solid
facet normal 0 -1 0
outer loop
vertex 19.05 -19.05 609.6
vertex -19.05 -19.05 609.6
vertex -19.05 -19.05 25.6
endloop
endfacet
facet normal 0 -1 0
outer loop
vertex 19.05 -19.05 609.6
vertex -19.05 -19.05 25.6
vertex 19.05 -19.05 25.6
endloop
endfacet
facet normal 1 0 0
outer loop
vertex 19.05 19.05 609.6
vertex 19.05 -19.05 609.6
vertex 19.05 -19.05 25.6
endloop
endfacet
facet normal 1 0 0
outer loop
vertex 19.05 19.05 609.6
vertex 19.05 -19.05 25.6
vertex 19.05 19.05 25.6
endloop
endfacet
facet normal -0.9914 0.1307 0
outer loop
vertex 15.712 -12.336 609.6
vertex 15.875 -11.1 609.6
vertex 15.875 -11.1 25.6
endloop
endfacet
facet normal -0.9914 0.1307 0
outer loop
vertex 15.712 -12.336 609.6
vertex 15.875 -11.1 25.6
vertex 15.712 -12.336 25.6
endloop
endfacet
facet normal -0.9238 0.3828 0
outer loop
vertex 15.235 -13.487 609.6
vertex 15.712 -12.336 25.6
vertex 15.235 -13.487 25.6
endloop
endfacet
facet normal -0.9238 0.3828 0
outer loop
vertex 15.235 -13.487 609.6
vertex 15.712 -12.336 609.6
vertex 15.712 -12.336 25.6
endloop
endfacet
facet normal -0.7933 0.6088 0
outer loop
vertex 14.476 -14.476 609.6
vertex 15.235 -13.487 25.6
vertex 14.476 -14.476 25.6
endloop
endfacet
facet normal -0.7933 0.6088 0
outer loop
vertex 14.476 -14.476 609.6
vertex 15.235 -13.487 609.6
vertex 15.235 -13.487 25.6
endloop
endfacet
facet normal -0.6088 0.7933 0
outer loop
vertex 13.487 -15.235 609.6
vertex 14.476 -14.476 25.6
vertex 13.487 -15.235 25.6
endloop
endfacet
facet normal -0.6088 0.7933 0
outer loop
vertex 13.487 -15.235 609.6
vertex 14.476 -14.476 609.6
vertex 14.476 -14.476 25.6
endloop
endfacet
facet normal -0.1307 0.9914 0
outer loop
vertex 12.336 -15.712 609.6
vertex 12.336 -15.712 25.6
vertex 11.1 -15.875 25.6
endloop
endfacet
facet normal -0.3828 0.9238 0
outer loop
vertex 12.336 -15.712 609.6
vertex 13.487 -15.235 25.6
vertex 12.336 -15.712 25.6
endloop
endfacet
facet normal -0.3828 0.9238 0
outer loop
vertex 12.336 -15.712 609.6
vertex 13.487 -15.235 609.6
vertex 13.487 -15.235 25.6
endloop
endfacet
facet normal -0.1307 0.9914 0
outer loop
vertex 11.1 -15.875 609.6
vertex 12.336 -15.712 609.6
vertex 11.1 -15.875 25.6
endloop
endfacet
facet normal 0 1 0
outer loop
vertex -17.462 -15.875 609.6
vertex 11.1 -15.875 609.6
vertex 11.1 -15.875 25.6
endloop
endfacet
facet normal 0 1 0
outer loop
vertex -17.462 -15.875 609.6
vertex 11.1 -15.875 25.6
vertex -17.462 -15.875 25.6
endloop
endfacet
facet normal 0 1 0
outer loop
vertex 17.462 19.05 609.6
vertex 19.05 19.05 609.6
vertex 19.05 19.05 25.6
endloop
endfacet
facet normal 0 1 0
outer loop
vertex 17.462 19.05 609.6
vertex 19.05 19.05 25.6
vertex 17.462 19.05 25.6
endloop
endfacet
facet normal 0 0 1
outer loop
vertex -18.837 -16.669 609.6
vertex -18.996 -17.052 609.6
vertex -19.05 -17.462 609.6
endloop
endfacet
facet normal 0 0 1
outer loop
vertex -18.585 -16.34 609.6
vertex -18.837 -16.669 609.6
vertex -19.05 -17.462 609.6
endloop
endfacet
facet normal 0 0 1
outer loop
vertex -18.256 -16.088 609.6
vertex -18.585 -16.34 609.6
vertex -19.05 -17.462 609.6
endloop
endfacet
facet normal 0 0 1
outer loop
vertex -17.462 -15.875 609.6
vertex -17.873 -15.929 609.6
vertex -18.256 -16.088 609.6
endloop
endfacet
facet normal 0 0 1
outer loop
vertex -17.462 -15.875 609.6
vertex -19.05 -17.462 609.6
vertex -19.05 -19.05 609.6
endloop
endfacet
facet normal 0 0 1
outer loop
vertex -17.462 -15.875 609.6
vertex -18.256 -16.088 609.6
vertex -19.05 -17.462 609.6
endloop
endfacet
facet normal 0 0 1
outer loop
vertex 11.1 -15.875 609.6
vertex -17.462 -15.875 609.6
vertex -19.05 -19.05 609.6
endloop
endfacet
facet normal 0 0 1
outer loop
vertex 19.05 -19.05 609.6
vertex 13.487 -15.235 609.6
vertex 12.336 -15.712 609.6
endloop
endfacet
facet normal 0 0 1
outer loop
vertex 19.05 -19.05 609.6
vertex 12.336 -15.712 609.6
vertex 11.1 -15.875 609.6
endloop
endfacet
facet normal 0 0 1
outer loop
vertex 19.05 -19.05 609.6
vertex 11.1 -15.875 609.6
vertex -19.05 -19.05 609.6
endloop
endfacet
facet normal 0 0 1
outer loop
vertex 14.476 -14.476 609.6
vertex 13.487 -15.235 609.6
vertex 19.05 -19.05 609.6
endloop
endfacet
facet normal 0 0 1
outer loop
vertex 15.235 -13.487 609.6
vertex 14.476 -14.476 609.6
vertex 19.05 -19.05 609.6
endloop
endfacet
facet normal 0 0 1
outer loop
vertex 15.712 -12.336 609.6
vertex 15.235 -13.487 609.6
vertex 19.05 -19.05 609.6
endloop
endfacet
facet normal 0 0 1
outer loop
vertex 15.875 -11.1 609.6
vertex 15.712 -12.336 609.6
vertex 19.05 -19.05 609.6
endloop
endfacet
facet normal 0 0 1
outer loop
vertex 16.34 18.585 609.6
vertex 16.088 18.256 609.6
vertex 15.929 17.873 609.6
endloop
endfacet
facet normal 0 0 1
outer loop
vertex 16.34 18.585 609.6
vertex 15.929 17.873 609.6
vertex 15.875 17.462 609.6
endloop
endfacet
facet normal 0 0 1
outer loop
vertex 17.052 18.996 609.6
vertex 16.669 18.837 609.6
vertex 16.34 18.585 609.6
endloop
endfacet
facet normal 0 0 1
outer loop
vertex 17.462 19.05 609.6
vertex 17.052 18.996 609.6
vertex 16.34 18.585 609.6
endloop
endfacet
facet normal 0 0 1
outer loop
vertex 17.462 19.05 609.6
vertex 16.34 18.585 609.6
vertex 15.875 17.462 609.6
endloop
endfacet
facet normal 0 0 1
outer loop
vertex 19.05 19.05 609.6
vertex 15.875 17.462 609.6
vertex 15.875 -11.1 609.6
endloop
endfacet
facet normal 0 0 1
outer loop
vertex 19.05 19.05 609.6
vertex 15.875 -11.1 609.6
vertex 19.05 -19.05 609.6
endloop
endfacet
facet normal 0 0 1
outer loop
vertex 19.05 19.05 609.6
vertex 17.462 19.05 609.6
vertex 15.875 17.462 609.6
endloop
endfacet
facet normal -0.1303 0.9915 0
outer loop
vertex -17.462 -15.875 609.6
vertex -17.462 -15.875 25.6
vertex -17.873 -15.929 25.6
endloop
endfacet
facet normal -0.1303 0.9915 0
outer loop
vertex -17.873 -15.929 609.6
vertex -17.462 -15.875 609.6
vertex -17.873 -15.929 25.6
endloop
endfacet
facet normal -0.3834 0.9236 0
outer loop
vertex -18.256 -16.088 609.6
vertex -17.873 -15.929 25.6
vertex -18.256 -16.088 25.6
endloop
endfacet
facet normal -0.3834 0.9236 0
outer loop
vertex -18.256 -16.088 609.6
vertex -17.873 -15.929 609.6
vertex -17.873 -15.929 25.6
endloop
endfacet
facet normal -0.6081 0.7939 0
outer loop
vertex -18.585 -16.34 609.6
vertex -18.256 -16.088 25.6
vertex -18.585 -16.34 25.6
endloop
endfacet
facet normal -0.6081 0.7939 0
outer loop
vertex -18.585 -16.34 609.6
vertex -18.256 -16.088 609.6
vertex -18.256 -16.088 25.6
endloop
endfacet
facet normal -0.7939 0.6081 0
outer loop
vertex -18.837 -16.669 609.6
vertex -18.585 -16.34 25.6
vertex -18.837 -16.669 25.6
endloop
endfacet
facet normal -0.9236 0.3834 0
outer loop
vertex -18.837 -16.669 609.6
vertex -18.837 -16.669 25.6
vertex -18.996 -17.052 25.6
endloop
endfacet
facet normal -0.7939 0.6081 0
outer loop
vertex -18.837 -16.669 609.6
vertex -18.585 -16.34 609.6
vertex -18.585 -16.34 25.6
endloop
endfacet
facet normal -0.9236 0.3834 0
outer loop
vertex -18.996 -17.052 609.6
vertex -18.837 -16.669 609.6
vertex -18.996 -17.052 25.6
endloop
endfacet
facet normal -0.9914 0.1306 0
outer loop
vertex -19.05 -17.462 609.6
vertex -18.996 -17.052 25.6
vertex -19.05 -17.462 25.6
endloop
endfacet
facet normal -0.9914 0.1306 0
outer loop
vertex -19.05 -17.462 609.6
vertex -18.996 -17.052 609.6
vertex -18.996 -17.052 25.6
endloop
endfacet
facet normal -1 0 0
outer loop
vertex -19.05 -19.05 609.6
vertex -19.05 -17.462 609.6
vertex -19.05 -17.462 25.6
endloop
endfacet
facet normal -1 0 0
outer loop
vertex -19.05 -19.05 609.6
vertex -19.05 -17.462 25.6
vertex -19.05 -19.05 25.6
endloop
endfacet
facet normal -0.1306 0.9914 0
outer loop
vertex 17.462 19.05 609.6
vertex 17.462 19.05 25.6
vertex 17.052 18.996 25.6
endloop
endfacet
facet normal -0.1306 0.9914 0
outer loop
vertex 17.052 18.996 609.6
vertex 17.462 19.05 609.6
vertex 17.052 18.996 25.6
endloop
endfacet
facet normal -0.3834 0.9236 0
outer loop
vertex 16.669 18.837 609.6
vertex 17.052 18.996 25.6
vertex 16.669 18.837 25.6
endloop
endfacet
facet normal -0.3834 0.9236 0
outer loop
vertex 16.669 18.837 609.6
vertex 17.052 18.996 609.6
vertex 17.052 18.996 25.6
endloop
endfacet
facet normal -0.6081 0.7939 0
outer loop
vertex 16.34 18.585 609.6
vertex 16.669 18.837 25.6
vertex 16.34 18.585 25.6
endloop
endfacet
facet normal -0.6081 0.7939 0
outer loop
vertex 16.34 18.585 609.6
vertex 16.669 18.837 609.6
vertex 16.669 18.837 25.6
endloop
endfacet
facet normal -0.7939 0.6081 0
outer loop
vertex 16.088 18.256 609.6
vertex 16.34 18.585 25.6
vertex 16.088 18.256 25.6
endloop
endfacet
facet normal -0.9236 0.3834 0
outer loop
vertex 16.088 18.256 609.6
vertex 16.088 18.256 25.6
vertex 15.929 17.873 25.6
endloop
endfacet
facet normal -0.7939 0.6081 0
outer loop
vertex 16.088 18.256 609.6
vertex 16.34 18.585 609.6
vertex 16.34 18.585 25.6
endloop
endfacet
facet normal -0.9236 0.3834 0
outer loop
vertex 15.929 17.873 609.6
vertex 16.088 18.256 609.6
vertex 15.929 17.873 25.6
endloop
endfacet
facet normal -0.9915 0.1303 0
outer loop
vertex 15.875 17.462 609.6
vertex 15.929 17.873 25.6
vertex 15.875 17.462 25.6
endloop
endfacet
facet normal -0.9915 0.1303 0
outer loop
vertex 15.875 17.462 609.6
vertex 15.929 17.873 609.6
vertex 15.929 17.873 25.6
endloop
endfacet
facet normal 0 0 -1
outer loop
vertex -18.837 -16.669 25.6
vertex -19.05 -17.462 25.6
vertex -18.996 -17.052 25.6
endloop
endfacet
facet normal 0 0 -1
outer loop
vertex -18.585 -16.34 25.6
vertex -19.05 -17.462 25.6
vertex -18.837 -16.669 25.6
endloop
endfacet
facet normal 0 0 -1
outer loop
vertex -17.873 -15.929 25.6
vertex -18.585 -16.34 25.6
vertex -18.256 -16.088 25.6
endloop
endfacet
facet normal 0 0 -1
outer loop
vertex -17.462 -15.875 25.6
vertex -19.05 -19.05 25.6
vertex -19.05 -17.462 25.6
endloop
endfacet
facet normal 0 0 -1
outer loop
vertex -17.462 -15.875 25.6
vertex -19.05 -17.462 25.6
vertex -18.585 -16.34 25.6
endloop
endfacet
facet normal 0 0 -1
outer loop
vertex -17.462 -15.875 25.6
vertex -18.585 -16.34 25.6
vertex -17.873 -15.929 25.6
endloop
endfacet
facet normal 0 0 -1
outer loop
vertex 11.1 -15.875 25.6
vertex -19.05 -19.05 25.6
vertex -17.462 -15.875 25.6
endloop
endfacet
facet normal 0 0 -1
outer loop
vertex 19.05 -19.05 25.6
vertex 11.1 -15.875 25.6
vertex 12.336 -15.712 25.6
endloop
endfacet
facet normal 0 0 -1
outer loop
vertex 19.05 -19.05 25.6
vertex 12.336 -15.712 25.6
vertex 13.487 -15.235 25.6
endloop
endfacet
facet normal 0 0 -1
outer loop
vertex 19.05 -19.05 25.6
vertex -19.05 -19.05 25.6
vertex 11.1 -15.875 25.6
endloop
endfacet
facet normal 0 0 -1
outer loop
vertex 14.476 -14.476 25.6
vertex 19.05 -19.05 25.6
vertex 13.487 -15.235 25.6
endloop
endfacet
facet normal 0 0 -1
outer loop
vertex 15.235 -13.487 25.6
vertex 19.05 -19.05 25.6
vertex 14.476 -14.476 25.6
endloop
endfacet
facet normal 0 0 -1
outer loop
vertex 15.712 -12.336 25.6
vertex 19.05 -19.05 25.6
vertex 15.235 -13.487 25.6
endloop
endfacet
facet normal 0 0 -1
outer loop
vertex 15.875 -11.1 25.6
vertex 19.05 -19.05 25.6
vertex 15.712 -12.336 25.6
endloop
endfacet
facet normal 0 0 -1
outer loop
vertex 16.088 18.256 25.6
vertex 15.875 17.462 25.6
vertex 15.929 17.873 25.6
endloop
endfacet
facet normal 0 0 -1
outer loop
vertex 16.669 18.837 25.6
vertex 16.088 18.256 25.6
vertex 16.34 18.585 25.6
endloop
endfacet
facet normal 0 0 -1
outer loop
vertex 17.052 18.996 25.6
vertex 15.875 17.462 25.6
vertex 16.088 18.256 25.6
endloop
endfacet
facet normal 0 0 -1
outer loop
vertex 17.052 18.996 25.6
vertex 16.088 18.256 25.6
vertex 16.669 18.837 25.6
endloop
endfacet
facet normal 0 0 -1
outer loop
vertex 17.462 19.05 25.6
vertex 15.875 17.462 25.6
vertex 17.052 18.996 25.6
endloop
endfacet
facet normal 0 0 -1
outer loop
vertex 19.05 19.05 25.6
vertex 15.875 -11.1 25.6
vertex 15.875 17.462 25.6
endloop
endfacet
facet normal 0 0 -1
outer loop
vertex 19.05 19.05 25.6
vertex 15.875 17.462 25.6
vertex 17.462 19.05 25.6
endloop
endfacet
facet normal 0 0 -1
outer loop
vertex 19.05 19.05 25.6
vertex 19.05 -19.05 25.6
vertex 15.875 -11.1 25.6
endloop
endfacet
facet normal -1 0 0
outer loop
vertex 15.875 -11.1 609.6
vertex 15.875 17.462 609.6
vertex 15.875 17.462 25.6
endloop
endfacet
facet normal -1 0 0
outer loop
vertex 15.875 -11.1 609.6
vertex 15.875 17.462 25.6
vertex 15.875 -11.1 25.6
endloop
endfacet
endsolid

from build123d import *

# Parameters (mm, degrees)
BOSS_EXTRUDE1_DEPTH = 609.6
SKETCH3_W           = 635.2
SKETCH3_H           = 38.1
CUT_EXTRUDE1_DEPTH  = 60


with BuildPart() as part:
    # Sketch2 → Boss-Extrude1 (new, symmetric)
    with BuildSketch(Plane.XY):
        with BuildLine():
            Line((-19.05, -19.05), (19.05, -19.05))
            Line((19.05, -19.05), (19.05, 19.05))
            Line((19.05, 19.05), (17.4625, 19.05))
            ThreePointArc((17.4625, 19.05), (16.339967985, 18.585032015), (15.875, 17.4625))
            Line((15.875, 17.4625), (15.875, -11.0998))
            ThreePointArc((15.875, -11.0998), (14.476376302, -14.476376302), (11.0998, -15.875))
            Line((11.0998, -15.875), (-17.4625, -15.875))
            ThreePointArc((-17.4625, -15.875), (-18.585032015, -16.339967985), (-19.05, -17.4625))
            Line((-19.05, -17.4625), (-19.05, -19.05))
        make_face()
    extrude(amount=BOSS_EXTRUDE1_DEPTH, both=True)

    # Sketch3 → Cut-Extrude1 (cut)
    with BuildSketch(Plane(origin=(19.05, 0, 0), x_dir=(0, 0, -1), z_dir=(1, 0, 0))):
        with Locations((292, 0)):
            Rectangle(SKETCH3_W, SKETCH3_H)
    extrude(amount=-CUT_EXTRUDE1_DEPTH, mode=Mode.SUBTRACT)


solid = part.part
